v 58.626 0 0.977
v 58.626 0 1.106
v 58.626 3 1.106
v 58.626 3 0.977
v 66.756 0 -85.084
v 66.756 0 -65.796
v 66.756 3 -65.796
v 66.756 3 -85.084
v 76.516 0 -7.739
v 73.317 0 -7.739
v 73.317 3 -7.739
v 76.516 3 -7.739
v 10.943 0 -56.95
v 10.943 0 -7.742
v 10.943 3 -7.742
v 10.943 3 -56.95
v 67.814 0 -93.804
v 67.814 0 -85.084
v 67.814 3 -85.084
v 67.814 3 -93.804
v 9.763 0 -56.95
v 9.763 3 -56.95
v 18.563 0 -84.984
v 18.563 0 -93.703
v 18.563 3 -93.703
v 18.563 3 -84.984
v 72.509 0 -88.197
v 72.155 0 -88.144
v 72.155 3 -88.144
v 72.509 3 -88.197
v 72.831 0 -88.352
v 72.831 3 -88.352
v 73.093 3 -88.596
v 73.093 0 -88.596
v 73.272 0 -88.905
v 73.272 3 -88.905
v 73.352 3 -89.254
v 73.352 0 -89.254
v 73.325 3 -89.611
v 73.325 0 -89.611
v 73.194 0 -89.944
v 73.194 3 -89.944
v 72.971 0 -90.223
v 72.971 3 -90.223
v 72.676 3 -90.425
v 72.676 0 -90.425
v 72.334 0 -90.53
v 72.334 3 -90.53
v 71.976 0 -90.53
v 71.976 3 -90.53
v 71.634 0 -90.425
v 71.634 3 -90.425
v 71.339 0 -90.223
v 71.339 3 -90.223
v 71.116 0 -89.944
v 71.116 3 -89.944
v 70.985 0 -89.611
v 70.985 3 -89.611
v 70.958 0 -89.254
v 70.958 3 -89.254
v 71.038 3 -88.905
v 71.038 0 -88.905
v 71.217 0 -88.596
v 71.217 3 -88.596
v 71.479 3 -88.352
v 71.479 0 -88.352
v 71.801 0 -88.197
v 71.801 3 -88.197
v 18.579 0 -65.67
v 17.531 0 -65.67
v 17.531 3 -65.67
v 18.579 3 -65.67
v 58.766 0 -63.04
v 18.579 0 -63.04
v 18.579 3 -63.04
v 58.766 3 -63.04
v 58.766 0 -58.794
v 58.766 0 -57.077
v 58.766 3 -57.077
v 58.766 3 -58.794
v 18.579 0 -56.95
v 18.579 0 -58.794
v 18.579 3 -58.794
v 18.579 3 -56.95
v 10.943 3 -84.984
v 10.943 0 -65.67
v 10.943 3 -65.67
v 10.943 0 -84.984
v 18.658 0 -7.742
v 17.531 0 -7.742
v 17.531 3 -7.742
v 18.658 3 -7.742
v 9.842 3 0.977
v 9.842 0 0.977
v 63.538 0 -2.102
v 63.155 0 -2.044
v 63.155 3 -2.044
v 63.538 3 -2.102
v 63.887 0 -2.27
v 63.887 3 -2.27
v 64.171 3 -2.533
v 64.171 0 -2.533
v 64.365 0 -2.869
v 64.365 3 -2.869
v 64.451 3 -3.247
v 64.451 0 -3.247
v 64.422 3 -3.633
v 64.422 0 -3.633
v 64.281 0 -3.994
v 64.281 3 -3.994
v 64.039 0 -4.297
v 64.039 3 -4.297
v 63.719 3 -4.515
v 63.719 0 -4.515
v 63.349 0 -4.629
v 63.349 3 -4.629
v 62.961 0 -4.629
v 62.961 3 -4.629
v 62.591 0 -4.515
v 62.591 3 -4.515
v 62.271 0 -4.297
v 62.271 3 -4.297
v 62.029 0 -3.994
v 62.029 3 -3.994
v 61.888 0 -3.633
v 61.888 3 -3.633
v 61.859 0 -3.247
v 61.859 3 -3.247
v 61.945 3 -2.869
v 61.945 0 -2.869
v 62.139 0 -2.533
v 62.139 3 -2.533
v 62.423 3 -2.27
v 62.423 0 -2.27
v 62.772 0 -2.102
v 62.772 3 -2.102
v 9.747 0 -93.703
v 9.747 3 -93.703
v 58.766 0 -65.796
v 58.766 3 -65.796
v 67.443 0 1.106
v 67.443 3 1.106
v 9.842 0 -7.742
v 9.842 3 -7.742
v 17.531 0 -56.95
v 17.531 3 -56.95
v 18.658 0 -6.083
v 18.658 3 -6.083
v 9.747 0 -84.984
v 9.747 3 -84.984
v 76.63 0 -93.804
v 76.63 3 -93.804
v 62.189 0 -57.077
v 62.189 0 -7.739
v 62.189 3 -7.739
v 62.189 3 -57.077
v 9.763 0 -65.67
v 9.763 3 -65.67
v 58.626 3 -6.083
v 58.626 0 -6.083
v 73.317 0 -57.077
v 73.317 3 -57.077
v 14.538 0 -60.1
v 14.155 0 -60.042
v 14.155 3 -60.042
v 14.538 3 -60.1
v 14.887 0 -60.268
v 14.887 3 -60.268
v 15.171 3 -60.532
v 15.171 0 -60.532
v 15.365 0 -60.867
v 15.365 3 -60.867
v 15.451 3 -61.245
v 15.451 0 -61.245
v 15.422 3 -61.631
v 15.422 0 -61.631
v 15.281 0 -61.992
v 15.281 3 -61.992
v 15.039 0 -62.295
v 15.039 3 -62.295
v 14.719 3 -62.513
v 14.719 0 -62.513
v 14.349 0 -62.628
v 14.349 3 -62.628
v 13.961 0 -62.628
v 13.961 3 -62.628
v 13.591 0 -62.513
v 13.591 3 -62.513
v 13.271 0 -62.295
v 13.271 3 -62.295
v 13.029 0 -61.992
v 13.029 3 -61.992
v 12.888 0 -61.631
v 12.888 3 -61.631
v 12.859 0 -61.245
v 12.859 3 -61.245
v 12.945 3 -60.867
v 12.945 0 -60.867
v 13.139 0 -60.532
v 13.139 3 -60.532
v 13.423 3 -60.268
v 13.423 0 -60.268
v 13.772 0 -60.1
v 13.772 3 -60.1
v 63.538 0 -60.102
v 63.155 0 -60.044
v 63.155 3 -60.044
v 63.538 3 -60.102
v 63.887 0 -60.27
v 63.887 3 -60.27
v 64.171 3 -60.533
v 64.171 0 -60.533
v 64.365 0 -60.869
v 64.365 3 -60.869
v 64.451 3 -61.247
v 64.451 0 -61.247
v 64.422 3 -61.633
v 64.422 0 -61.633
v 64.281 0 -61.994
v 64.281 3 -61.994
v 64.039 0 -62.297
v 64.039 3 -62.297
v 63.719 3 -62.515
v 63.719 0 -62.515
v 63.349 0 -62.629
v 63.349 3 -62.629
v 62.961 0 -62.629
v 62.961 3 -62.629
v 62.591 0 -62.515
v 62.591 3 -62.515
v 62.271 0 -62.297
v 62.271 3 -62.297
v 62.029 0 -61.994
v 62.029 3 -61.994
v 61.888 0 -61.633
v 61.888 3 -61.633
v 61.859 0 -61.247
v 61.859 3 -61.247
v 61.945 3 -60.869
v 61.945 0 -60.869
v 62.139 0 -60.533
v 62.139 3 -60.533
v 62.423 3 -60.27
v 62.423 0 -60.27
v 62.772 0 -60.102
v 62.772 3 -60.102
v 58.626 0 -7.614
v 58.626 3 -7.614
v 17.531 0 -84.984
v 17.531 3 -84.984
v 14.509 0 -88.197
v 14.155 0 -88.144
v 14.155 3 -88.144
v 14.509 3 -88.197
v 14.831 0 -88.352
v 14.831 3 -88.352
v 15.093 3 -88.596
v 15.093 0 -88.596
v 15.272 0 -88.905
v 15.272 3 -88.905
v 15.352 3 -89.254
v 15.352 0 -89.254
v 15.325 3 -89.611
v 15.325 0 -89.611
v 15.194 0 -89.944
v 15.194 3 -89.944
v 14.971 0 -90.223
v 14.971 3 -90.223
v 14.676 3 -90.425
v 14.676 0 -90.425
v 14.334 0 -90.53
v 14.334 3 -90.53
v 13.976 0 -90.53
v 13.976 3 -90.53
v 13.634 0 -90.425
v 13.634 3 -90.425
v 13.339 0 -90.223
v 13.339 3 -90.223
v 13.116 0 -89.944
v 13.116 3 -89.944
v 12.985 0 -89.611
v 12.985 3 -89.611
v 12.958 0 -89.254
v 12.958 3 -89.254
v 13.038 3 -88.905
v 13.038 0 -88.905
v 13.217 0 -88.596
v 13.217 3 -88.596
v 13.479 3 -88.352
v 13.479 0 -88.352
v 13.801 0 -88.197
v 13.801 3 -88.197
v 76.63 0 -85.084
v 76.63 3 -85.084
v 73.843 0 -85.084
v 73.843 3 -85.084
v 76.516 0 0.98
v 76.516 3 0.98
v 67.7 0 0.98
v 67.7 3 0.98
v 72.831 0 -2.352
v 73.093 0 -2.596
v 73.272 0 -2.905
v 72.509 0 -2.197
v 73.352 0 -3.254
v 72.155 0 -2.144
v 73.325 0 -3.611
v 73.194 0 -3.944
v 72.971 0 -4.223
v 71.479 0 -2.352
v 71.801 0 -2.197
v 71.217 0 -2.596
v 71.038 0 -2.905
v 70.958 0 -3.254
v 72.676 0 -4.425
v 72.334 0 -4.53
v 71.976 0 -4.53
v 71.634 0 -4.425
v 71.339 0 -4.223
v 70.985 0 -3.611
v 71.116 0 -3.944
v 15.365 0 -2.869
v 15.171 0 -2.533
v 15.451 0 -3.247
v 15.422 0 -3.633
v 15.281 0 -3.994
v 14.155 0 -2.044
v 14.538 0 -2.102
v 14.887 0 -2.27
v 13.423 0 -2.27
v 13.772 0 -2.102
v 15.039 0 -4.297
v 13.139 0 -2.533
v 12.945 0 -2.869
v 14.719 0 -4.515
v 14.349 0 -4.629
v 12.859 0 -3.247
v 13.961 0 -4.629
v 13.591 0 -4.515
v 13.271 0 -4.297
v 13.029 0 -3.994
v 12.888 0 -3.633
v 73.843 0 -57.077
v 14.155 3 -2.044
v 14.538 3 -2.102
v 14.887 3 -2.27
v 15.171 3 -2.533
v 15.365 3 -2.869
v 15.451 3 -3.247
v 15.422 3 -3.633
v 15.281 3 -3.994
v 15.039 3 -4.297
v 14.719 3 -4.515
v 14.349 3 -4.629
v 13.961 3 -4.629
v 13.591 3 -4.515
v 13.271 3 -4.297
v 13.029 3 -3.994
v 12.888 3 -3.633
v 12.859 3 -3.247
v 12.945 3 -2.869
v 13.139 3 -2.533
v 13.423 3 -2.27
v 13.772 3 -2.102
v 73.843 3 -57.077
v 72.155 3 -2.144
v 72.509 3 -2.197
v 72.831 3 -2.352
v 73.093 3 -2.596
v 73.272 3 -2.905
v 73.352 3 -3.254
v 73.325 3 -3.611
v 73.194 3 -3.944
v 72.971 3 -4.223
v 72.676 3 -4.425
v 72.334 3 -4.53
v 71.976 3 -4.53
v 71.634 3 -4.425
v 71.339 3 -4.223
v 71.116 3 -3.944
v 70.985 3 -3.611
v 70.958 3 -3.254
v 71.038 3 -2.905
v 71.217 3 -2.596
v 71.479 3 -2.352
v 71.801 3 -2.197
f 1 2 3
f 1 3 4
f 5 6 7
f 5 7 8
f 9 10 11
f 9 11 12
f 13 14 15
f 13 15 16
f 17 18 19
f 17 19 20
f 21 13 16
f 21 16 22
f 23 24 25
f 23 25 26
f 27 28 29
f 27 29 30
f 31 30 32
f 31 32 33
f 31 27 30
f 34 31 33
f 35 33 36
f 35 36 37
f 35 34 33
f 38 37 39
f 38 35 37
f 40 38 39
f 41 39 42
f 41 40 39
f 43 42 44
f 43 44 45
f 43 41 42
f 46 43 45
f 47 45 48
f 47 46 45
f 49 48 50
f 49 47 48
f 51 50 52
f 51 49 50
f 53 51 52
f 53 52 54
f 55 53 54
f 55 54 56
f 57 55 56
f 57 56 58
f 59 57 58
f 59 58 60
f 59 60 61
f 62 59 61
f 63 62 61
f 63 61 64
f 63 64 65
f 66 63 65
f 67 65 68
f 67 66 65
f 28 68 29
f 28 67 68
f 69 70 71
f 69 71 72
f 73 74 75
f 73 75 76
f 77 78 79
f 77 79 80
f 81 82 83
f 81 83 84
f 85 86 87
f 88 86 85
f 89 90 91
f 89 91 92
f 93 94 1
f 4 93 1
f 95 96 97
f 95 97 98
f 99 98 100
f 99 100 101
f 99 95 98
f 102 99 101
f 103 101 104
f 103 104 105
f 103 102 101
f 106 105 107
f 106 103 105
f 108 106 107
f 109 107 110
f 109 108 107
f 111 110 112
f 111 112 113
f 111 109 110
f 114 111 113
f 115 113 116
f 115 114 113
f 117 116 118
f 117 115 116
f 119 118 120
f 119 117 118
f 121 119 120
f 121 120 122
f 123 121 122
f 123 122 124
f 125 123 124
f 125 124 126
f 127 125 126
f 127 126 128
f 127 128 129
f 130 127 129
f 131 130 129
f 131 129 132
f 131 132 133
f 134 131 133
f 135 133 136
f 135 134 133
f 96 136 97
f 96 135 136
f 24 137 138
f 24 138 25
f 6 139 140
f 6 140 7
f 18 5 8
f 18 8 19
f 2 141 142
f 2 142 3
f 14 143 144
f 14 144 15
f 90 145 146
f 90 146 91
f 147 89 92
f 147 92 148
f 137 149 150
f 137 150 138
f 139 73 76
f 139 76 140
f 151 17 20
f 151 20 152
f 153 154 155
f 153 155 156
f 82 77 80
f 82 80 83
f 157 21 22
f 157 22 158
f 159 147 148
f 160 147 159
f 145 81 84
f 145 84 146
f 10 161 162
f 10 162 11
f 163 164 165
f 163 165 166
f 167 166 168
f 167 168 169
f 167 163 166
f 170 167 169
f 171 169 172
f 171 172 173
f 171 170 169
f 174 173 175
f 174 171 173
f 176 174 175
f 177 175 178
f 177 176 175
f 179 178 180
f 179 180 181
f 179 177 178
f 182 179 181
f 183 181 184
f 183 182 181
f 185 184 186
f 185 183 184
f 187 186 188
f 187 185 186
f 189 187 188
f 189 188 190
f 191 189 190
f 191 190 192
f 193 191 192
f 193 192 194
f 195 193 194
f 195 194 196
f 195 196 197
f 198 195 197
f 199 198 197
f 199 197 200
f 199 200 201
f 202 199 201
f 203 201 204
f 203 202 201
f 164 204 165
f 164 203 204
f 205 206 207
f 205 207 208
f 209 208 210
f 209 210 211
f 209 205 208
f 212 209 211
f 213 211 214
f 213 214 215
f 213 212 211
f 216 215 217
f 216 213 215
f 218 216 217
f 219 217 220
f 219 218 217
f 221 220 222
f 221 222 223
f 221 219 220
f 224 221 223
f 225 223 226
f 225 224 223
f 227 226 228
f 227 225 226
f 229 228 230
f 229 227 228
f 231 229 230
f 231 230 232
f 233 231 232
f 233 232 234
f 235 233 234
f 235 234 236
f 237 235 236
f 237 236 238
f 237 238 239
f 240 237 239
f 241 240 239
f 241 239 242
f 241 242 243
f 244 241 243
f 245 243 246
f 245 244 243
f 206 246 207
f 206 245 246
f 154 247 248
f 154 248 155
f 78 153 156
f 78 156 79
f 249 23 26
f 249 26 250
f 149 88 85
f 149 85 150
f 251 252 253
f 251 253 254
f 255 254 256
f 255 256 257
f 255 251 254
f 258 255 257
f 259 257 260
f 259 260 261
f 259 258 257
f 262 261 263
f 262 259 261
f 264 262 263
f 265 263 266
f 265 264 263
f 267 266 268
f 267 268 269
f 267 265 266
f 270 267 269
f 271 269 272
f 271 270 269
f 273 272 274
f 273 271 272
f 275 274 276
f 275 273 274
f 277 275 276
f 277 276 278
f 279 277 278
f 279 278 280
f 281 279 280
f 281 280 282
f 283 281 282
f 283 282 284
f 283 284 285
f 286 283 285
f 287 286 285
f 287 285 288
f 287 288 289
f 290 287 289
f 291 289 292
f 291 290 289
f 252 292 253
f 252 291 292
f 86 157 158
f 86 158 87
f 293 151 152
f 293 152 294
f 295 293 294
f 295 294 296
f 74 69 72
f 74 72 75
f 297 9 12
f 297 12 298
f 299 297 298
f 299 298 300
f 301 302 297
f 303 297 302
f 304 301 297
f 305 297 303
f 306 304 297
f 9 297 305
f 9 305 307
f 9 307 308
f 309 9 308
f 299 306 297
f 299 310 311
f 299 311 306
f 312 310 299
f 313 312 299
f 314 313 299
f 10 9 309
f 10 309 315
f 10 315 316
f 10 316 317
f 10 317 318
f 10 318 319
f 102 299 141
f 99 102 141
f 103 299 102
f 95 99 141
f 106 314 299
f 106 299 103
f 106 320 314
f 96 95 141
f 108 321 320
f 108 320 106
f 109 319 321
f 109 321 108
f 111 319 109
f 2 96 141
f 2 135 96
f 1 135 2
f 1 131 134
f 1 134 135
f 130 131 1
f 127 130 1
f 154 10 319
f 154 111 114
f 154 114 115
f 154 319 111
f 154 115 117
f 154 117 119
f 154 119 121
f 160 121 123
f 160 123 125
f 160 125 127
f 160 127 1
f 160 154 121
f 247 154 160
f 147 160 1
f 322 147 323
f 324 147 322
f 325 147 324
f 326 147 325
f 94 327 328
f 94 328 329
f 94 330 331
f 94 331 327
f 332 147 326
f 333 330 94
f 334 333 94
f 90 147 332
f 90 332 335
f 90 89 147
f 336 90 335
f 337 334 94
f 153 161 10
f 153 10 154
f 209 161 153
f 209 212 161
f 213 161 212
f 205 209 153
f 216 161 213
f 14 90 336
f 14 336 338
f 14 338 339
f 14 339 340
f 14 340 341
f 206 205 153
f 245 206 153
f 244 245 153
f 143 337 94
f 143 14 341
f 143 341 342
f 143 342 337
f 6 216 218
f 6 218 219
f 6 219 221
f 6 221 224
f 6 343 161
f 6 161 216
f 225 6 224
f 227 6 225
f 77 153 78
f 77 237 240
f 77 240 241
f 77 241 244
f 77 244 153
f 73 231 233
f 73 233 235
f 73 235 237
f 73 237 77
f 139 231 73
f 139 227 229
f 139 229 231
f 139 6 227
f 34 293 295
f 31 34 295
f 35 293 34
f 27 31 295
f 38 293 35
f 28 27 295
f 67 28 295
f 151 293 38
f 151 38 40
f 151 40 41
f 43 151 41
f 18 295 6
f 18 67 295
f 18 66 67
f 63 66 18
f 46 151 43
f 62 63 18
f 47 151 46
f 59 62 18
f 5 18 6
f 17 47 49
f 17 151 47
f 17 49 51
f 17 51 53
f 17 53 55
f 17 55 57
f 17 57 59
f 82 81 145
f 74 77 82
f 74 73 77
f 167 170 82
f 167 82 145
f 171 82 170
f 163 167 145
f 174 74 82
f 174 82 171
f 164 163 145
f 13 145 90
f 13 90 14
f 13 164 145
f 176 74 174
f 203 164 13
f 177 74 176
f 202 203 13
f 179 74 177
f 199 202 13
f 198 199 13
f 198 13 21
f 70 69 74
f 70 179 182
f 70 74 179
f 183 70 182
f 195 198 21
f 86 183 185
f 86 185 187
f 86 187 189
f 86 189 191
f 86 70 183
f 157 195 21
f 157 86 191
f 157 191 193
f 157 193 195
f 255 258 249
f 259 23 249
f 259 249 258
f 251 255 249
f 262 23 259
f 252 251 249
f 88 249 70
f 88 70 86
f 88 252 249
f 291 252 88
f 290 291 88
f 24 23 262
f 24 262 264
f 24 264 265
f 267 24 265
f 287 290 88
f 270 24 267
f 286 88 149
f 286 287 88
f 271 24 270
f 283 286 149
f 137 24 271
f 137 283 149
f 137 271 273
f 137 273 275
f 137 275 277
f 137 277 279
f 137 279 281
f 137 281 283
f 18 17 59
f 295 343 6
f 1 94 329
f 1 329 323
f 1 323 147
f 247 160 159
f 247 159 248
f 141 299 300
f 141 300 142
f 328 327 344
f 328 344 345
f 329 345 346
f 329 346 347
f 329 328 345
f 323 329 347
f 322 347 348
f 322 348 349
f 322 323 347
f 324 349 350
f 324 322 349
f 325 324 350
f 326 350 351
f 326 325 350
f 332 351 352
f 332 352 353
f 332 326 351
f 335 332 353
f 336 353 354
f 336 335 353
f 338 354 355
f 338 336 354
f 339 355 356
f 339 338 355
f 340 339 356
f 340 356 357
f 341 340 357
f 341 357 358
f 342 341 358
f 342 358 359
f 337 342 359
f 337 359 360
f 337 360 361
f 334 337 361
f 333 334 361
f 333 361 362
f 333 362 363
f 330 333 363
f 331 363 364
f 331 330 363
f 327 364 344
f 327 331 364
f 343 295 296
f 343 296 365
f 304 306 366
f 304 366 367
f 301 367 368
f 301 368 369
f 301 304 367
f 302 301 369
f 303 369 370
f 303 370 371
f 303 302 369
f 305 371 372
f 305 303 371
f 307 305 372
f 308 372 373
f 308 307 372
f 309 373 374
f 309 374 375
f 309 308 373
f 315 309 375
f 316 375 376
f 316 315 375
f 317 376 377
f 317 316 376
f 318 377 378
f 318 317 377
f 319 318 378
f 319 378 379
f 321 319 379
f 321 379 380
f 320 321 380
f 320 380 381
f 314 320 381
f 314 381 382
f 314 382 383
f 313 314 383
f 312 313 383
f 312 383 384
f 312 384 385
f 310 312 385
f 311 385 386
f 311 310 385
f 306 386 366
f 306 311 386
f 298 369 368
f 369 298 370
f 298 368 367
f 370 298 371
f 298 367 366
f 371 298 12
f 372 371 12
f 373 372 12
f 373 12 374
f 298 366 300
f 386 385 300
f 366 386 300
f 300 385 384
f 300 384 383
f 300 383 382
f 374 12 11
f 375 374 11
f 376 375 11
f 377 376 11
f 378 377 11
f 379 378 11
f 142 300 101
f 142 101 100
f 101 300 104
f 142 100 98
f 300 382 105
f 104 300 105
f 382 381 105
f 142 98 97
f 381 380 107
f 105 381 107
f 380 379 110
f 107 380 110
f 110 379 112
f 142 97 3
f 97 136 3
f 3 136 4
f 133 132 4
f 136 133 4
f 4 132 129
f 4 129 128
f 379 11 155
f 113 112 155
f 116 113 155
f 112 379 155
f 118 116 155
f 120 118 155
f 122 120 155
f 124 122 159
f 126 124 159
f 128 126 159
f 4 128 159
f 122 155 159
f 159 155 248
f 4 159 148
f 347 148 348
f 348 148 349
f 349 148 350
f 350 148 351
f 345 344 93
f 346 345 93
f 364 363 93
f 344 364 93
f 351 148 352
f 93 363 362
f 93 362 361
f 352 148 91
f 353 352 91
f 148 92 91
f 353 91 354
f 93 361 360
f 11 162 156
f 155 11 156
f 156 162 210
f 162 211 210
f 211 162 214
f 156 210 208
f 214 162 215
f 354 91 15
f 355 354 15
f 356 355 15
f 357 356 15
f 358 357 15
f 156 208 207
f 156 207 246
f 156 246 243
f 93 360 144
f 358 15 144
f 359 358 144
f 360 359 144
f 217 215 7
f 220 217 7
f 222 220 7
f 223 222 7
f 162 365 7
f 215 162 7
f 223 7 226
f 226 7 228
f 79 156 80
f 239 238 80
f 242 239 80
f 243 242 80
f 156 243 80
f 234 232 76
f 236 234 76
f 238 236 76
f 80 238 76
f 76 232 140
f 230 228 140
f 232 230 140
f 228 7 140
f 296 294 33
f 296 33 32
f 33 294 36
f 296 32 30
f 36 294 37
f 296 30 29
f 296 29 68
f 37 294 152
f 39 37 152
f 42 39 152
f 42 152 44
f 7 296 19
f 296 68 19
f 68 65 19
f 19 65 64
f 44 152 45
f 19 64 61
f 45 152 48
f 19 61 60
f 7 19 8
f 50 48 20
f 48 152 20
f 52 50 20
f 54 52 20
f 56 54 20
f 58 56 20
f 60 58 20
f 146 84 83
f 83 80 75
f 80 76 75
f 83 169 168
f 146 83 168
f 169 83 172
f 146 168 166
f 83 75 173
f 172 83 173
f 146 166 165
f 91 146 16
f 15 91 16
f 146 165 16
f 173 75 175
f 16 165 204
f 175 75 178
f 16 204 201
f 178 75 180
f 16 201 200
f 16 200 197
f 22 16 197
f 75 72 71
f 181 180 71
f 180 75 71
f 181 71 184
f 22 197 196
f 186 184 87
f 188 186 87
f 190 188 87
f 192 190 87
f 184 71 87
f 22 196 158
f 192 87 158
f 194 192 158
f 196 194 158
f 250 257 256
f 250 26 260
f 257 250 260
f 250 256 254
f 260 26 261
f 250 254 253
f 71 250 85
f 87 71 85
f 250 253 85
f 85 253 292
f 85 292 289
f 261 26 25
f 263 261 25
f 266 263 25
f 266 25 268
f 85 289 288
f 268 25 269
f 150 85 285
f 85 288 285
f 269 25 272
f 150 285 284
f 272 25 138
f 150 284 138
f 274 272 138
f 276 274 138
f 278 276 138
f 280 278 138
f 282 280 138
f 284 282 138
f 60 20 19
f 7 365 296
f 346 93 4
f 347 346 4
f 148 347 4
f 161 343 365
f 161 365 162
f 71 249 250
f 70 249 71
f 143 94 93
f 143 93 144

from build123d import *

# Parameters (mm, degrees)
SKETCH1_R           = 1.3
SKETCH1_R_2         = 1.2
BOSS_EXTRUDE1_DEPTH = 3


with BuildPart() as part:
    # Sketch1 → Boss-Extrude1 (new body)
    with BuildSketch(Plane(origin=(0, 0, 0), x_dir=(1, 0, 0), z_dir=(0, 1, 0))):
        Polygon((9.762662215, 65.669537047), (10.942509785, 65.669537047), (10.942509785, 84.984003028), (9.746724448, 84.984003028), (9.746724448, 93.703488322), (18.563219001, 93.703488322), (18.563219001, 84.984003028), (17.531387454, 84.984003028), (17.531387454, 65.669537047), (18.579156769, 65.669537047), (18.579156769, 63.040010061), (58.765583648, 63.040010061), (58.765583648, 65.796335383), (66.755517737, 65.796335383), (66.755517737, 85.084147443), (67.813967442, 85.084147443), (67.813967442, 93.803632737), (76.630461995, 93.803632737), (76.630461995, 85.084147443), (73.843318023, 85.084147443), (73.843318023, 57.076850089), (73.317218387, 57.076850089), (73.317218387, 7.739461046), (76.516310065, 7.739461046), (76.516310065, -0.980024248), (67.699815511, -0.980024248), (67.442656599, -1.105588805), (58.626162046, -1.105588805), (58.626162046, -0.977439081), (18.658261308, -0.977439081), (9.841766755, -0.977439081), (9.841766755, 7.742046212), (10.942509785, 7.742046212), (10.942509785, 56.950051753), (9.762662215, 56.950051753), align=None)
        with Locations(Location((14.154971724, 3.343745675, 0), (0, 0, 270))):
            Circle(SKETCH1_R, mode=Mode.SUBTRACT)
        with Locations(Location((63.154971724, 3.343745675, 0), (0, 0, 270))):
            Circle(SKETCH1_R, mode=Mode.SUBTRACT)
        with Locations(Location((14.154971724, 61.342146029, 0), (0, 0, 270))):
            Circle(SKETCH1_R, mode=Mode.SUBTRACT)
        with Locations(Location((63.154971698, 61.343745675, 0), (0, 0, 270))):
            Circle(SKETCH1_R, mode=Mode.SUBTRACT)
        with Locations(Location((72.154971724, 3.343745675, 0), (0, 0, 270))):
            Circle(SKETCH1_R_2, mode=Mode.SUBTRACT)
        with Locations(Location((72.154971724, 89.343745675, 0), (0, 0, 270))):
            Circle(SKETCH1_R_2, mode=Mode.SUBTRACT)
        with Locations(Location((14.154971724, 89.343745675, 0), (0, 0, 270))):
            Circle(SKETCH1_R_2, mode=Mode.SUBTRACT)
        Polygon((18.658261308, 7.742046212), (18.658261308, 6.082823098), (58.626162046, 6.082823098), (58.626162046, 7.613896488), (62.189336101, 7.739461046), (62.189336101, 57.076850089), (58.765583648, 57.076850089), (58.765583648, 58.793844452), (18.579156769, 58.793844452), (18.579156769, 56.950051753), (17.531387454, 56.950051753), (17.531387454, 7.742046212), align=None, mode=Mode.SUBTRACT)
    extrude(amount=BOSS_EXTRUDE1_DEPTH)


solid = part.part
